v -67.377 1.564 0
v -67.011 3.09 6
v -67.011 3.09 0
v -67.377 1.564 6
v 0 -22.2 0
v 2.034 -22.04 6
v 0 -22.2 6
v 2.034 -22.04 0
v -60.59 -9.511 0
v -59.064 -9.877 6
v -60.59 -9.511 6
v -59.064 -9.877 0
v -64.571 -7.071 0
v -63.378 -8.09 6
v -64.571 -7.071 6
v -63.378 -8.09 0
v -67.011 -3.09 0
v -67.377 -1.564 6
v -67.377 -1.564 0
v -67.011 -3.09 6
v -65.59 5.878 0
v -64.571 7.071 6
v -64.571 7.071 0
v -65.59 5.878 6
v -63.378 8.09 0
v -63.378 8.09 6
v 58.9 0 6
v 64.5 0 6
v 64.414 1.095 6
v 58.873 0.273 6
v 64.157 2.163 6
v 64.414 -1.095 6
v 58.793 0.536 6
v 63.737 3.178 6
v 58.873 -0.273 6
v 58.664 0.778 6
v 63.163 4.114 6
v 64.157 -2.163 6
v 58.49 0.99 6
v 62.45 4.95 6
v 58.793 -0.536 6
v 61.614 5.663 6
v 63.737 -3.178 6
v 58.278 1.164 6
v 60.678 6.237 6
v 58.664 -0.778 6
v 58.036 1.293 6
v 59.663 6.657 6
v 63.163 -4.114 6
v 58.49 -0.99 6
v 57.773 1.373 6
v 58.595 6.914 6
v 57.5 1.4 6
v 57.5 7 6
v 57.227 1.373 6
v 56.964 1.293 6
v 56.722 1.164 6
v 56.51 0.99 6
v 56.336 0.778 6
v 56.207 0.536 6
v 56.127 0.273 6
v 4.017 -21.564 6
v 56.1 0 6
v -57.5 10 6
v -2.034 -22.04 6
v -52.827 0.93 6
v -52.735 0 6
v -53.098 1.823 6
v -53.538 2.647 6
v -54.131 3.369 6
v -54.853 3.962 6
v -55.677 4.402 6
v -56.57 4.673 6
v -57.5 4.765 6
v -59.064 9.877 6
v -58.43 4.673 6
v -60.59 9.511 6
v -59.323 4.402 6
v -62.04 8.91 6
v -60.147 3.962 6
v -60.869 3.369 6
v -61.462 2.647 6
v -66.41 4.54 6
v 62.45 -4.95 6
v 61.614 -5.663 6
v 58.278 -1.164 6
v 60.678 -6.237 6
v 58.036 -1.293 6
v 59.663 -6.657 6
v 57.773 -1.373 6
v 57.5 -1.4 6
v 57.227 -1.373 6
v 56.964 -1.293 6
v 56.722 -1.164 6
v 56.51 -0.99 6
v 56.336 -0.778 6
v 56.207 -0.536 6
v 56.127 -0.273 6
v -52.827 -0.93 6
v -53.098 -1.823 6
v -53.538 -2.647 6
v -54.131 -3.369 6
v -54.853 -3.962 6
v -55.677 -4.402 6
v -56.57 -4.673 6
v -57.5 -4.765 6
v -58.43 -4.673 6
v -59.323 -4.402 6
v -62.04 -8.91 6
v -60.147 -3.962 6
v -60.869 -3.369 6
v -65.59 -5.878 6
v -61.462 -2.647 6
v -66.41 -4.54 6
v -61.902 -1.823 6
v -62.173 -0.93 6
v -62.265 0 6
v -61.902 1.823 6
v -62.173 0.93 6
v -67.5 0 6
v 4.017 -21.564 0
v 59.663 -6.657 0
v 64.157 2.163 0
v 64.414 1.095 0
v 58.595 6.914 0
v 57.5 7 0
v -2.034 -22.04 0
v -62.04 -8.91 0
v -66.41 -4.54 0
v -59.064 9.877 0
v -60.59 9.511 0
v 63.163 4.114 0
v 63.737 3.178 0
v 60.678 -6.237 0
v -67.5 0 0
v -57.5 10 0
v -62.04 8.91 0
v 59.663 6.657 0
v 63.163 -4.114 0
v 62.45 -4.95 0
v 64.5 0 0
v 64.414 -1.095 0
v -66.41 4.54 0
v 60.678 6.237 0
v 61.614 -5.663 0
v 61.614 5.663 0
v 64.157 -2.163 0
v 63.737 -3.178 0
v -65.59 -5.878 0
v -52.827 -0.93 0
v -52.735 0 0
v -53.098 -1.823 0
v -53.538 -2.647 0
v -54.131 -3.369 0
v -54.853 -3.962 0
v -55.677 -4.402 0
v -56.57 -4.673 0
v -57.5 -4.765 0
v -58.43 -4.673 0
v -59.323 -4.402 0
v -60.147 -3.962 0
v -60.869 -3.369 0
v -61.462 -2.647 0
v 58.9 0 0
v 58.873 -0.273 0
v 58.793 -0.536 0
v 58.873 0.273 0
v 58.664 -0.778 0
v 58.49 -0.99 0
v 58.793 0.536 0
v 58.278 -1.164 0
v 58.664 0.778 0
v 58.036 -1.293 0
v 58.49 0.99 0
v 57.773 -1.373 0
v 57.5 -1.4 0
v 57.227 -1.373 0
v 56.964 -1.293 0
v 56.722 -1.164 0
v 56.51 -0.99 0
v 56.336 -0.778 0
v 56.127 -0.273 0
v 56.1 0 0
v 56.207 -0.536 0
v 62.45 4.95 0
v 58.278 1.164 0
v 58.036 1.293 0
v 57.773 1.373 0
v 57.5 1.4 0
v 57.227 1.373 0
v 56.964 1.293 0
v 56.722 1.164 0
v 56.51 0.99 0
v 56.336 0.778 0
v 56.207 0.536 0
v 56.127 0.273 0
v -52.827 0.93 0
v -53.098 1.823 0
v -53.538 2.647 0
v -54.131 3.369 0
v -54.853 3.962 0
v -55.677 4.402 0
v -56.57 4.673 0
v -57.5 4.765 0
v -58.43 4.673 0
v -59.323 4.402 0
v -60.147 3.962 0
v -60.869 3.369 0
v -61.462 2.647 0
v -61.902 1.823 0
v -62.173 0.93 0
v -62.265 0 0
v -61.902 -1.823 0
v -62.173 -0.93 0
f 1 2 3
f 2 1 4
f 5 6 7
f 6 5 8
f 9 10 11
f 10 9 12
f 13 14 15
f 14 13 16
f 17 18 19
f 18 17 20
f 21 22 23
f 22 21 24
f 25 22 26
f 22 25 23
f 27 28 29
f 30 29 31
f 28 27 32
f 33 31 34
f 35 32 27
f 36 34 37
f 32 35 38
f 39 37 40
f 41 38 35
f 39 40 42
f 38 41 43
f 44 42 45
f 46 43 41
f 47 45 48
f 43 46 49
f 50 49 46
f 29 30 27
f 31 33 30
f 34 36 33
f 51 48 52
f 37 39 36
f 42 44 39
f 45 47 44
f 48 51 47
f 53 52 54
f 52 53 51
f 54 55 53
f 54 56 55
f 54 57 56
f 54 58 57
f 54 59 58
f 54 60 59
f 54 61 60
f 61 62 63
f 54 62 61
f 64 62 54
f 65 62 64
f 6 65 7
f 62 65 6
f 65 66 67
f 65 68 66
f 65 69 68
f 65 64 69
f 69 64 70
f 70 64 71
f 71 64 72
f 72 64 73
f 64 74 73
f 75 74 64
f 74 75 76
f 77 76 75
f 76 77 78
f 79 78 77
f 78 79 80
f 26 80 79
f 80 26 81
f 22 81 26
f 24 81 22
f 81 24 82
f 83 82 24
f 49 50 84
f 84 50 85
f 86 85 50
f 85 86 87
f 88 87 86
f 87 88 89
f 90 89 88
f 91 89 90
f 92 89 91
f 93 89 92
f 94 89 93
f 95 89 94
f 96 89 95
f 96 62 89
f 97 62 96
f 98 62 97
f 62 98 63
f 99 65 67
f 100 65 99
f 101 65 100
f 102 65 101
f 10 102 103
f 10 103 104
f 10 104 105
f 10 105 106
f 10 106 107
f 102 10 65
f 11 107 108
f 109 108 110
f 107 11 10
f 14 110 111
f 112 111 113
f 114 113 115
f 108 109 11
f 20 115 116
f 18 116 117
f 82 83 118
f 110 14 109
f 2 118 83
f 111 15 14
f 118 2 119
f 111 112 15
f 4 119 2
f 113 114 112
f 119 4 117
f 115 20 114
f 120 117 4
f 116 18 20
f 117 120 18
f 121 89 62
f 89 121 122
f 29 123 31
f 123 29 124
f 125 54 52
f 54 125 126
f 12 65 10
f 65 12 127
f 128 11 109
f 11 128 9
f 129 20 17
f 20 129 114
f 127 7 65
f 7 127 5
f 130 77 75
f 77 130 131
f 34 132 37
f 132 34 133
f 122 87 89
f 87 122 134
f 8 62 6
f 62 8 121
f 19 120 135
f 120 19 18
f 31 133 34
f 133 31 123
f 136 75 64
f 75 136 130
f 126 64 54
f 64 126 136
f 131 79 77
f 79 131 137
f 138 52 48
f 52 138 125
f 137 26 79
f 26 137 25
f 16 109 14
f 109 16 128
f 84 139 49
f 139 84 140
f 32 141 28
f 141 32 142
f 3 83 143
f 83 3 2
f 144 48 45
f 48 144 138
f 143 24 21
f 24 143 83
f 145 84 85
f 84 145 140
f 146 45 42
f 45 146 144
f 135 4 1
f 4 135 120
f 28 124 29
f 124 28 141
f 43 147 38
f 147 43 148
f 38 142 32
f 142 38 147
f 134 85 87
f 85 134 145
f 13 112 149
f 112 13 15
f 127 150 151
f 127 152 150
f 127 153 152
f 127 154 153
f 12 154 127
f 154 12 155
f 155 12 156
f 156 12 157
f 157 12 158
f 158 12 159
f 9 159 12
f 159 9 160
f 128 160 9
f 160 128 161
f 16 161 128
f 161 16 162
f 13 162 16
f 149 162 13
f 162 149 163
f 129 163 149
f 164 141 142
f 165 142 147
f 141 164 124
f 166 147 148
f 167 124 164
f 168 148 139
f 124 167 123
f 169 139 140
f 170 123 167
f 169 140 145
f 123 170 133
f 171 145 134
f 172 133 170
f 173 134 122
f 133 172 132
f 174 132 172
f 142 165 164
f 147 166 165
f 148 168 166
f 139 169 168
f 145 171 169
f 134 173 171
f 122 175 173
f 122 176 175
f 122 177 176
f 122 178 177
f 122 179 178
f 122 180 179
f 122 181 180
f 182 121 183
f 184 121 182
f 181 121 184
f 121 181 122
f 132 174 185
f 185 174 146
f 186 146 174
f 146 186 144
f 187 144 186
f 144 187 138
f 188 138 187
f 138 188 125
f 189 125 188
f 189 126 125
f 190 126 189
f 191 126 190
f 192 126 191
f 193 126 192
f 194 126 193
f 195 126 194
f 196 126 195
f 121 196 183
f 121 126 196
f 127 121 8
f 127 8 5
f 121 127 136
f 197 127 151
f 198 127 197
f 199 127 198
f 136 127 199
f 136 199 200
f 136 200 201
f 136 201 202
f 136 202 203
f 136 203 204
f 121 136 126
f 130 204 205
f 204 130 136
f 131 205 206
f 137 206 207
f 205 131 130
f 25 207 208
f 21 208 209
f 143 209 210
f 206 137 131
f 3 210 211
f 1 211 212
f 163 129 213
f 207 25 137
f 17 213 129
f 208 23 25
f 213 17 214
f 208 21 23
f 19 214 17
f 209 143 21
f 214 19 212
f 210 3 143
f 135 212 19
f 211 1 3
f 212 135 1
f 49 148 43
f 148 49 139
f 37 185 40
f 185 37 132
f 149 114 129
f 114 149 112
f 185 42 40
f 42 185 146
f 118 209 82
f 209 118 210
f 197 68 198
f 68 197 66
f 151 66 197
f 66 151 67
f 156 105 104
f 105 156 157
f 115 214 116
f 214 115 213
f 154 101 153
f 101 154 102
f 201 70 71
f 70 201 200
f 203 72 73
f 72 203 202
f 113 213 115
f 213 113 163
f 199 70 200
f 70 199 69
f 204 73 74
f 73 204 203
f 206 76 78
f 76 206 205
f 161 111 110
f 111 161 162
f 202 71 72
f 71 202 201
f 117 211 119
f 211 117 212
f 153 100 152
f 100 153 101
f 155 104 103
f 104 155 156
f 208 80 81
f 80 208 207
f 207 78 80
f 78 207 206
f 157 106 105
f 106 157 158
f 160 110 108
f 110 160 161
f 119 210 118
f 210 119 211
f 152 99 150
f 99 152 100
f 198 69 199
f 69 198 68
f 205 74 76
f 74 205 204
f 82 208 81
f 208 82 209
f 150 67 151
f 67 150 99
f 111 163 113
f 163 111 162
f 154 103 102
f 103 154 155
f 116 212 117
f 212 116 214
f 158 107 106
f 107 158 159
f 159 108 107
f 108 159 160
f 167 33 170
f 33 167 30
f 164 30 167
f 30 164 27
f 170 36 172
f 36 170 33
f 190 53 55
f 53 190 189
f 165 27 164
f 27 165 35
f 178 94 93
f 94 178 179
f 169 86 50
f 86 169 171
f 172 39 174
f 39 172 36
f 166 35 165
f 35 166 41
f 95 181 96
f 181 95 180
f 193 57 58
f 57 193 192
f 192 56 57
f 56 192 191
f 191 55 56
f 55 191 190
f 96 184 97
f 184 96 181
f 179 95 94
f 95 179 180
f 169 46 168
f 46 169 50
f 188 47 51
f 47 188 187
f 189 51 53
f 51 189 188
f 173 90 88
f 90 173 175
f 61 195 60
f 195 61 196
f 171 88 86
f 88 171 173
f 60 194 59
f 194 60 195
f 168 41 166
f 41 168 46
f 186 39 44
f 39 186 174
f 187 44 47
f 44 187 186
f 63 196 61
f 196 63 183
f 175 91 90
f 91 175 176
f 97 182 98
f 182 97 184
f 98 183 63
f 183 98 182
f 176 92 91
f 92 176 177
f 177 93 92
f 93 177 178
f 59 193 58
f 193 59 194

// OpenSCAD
$fn = 32;

// ----------------------------------------------------------------------
// Lever: 115 mm between the bosses, 6 mm thick, smooth outline
// ----------------------------------------------------------------------

// --- parameters (mm) ---
lever_l = 115;            // distance between the boss centres
boss_a = 20;              // first boss diameter
boss_b = 14;              // second boss diameter
bore_a = 9.53;            // first bore
bore_b = 2.8;             // second bore
lever_t = 6;              // lever thickness
boss_c = 26;              // middle boss diameter
bend = 9.2;               // how far the middle boss drops

lever_profile = [[-67.5, 0], [-67.377, -1.564], [-67.011, -3.09], [-66.41, -4.54], [-65.59, -5.878], [-64.571, -7.071], [-63.378, -8.09], [-62.04, -8.91], [-60.59, -9.511], [-59.064, -9.877], [-2.034, -22.04], [0, -22.2], [2.034, -22.04], [4.017, -21.564], [59.663, -6.657], [60.678, -6.237], [61.614, -5.663], [62.45, -4.95], [63.163, -4.114], [63.737, -3.178], [64.157, -2.163], [64.414, -1.095], [64.5, 0], [64.414, 1.095], [64.157, 2.163], [63.737, 3.178], [63.163, 4.114], [62.45, 4.95], [61.614, 5.663], [60.678, 6.237], [59.663, 6.657], [58.595, 6.914], [57.5, 7], [-57.5, 10], [-59.064, 9.877], [-60.59, 9.511], [-62.04, 8.91], [-63.378, 8.09], [-64.571, 7.071], [-65.59, 5.878], [-66.41, 4.54], [-67.011, 3.09], [-67.377, 1.564]];

difference() {
  linear_extrude(height = lever_t) polygon(lever_profile);
  translate([-57.5, 0, -2.5]) cylinder(h = lever_t + 5, d = bore_a);
  translate([57.5, 0, -2.5]) cylinder(h = lever_t + 5, d = bore_b);
}
